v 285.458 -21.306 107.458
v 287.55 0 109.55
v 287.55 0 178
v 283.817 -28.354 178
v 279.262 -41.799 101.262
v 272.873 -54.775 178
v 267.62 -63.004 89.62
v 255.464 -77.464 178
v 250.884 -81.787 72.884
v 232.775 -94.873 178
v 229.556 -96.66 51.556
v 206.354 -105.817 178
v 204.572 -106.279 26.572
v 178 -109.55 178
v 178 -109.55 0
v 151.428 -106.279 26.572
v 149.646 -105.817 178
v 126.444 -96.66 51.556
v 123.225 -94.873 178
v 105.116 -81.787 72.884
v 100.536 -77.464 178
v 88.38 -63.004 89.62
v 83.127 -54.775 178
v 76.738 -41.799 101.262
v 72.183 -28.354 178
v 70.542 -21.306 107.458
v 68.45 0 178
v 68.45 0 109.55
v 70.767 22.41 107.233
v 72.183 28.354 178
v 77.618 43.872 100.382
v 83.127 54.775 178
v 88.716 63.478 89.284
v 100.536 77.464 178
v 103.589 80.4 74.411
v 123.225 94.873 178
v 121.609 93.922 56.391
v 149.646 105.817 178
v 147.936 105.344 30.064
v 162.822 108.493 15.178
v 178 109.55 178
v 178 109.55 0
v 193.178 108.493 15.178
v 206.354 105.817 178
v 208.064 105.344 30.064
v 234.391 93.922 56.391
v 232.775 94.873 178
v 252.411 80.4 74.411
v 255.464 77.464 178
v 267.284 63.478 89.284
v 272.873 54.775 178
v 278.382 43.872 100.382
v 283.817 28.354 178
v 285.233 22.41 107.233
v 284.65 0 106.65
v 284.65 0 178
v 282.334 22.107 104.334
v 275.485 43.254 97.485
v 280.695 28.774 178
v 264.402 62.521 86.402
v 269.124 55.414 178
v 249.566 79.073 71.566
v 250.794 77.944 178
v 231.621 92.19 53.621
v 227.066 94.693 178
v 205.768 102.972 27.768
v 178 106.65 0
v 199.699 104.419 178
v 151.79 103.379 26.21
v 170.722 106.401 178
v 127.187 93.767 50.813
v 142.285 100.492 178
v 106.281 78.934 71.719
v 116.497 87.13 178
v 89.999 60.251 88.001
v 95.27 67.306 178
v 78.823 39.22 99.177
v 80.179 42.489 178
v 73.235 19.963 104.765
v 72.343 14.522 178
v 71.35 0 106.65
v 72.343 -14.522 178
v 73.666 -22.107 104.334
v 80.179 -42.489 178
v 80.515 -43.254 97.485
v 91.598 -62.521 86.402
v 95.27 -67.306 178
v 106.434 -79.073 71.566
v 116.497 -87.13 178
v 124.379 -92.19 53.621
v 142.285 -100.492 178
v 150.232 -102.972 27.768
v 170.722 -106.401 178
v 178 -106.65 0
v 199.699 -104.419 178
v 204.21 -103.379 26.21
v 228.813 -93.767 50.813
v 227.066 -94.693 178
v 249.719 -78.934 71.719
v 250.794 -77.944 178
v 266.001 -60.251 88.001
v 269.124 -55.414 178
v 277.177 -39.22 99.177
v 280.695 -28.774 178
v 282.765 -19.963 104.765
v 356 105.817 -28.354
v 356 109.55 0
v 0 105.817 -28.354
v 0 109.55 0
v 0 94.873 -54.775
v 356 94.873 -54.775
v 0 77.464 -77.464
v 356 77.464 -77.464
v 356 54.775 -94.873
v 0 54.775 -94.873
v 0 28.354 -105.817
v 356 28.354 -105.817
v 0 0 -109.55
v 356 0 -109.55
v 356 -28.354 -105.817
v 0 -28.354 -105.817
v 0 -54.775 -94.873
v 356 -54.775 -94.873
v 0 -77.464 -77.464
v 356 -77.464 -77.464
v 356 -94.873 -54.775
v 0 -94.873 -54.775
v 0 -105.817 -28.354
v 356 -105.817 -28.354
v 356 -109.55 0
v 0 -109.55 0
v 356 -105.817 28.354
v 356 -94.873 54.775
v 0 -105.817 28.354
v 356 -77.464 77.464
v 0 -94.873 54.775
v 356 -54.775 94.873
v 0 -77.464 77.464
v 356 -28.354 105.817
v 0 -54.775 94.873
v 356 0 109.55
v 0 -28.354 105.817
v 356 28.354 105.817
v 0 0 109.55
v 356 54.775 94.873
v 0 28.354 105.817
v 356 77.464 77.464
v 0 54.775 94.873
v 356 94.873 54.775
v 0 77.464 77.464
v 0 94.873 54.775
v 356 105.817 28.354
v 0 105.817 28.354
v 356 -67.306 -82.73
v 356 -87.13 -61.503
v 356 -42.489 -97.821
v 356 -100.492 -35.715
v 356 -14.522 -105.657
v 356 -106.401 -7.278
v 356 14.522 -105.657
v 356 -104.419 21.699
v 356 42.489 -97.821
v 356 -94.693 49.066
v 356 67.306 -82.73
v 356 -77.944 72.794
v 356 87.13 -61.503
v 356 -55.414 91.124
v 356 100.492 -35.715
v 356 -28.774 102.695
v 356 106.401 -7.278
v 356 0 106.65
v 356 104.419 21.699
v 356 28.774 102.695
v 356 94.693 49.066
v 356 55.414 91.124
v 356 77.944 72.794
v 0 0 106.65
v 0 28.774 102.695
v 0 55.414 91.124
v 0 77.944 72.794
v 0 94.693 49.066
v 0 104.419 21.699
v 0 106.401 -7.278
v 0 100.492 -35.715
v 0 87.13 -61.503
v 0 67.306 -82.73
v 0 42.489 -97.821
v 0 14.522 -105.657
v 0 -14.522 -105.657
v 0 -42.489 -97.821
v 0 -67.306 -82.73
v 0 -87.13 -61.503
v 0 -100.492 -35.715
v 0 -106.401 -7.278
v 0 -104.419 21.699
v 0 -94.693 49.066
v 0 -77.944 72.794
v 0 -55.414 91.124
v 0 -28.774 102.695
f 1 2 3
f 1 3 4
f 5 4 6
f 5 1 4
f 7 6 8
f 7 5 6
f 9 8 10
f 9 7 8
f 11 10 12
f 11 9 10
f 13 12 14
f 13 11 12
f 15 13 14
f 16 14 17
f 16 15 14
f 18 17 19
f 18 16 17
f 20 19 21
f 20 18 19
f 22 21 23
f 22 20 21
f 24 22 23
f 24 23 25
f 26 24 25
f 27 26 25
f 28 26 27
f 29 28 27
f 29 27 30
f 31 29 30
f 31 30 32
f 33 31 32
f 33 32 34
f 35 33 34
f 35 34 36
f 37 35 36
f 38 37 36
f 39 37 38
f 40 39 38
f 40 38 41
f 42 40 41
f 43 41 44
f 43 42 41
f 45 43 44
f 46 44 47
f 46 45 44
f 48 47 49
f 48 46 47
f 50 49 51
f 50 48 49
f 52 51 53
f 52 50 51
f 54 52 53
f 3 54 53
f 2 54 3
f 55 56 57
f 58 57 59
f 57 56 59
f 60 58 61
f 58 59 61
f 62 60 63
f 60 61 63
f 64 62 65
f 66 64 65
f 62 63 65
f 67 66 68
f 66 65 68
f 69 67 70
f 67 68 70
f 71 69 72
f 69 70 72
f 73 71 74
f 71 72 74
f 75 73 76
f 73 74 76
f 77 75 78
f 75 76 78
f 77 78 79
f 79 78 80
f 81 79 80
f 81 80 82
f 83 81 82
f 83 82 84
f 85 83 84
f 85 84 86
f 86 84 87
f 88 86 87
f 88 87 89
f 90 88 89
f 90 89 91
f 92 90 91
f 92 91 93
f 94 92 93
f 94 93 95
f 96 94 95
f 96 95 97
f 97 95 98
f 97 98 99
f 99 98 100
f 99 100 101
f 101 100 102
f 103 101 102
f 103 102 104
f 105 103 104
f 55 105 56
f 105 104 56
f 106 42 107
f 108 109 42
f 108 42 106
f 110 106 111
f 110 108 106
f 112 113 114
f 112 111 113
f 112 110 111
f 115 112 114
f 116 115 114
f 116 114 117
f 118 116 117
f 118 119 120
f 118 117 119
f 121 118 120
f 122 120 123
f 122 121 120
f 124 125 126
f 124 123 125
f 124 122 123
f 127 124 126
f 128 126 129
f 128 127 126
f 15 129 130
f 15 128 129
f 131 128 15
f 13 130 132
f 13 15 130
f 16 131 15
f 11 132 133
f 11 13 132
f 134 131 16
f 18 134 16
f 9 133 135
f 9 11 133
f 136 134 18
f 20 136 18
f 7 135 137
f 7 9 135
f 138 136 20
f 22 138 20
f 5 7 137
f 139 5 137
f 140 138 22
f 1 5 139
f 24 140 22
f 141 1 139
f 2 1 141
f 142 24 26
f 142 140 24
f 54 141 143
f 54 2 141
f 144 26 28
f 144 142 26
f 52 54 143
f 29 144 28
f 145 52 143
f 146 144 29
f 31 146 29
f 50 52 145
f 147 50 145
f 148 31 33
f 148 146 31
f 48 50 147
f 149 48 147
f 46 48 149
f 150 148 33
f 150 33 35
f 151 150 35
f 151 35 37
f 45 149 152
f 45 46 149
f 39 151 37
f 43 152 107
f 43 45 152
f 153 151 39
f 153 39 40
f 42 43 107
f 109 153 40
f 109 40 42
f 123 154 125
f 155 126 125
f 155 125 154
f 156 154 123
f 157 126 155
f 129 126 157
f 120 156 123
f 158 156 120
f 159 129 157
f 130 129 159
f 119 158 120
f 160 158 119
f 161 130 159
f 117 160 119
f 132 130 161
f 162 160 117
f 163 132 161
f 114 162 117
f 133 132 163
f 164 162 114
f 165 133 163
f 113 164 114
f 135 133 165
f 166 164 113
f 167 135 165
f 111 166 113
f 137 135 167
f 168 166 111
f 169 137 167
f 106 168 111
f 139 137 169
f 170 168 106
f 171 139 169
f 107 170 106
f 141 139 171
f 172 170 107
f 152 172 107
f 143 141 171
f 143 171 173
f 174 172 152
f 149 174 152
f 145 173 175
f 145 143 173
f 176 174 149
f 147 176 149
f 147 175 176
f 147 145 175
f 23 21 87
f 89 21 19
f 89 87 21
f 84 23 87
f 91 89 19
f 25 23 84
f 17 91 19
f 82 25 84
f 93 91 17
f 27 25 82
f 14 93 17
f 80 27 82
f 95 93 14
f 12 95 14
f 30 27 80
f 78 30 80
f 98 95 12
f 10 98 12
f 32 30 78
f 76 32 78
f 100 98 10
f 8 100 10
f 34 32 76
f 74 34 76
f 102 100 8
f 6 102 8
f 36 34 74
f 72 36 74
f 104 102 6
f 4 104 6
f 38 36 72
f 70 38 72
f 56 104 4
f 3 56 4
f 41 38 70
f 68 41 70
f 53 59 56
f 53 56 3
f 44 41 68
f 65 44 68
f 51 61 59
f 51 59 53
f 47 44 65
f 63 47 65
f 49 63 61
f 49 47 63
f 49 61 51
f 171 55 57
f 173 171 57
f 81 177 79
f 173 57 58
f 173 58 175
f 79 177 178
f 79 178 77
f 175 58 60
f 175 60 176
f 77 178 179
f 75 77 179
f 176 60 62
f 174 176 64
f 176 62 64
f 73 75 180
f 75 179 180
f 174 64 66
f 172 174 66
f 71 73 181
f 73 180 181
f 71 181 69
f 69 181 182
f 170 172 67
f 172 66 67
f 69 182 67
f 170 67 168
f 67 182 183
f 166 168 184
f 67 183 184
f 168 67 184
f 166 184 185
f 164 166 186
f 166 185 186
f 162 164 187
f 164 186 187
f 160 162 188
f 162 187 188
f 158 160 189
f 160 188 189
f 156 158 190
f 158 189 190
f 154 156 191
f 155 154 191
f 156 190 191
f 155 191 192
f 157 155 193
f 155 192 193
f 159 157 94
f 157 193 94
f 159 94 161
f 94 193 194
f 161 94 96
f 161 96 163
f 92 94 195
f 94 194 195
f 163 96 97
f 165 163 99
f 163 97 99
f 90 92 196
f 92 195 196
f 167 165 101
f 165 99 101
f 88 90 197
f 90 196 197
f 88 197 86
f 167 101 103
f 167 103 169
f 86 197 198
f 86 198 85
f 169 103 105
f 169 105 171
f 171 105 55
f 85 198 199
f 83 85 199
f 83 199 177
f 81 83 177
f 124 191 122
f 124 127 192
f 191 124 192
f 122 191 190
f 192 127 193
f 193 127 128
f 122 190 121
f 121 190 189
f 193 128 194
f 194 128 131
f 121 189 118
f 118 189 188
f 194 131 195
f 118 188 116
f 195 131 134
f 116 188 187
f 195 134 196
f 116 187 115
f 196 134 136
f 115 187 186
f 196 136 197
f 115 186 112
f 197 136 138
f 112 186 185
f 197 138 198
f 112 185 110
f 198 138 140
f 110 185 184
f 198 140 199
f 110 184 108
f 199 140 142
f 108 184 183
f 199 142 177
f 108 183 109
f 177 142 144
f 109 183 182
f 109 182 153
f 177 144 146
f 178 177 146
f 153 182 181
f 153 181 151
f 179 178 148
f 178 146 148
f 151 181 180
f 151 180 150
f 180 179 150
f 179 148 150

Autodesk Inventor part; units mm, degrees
ref_plane "YZ Plane" through (0, 0, 0) normal (1, 0, 0) x (0, 1, 0)
ref_plane "XZ Plane" through (0, 0, 0) normal (0, 1, 0) x (-1, 0, 0)
ref_plane "XY Plane" through (0, 0, 0) normal (0, 0, 1) x (1, 0, 0)
sketch "Sketch1" plane through (0, 0, 0) normal (1, 0, 0) x (0, 1, 0)
  circle A0 centre (0, 0) radius 109.55
  dimension "d0" = 219.1
extrude "Extrude1" add sketch "Sketch1" along normal blind 356
sketch "Sketch2" plane through (0, 0, 0) normal (0, 0, 1) x (1, 0, 0)
  line L0 (0, 109.55) -> (0, -109.55) projected
  line L1 (356, 109.55) -> (356, -109.55) projected
  line L2 (0, 0) -> (356, 0) construction
  circle A0 centre (178, 0) radius 109.55
  dimension "d3" = 219.1
extrude "Extrude2" add sketch "Sketch2" along normal blind 178
sketch "Sketch3" plane through (0, 0, 0) normal (-1, 0, 0) x (0, 0, 1)
  circle A0 centre (0, 0) radius 109.55 projected
  circle A1 centre (0, 0) radius 106.65
  dimension "d6" = 213.3
extrude "Extrude3" cut sketch "Sketch3" against normal through all contours A1
sketch "Sketch4" plane through (178, 0, 178) normal (0, 0, 1) x (1, 0, 0)
  circle A0 centre (0, 0) radius 109.55 projected
  circle A1 centre (0, 0) radius 106.65
  dimension "d9" = 213.3
extrude "Extrude4" cut sketch "Sketch4" against normal up to next contours A1
equation "\"d0\" = d"
equation "\"d1\" = 2 * a"
equation "\"d3\" = d"
equation "\"d4\" = a"
equation "\"d6\" = d - 2 * s1"
equation "\"d7\" = a"
equation "\"d9\" = d - 2 * s1"
equation "\"d10\" = a"
equation "\"d\" = 219.1"
equation "\"s1\" = 2.9"
equation "\"a\" = 178"
equation "\"Size_Designation\" = 1.2345"
properties part number "DIN 2615-1 Tee 219.1 x 2.9 S" material "Steel"
